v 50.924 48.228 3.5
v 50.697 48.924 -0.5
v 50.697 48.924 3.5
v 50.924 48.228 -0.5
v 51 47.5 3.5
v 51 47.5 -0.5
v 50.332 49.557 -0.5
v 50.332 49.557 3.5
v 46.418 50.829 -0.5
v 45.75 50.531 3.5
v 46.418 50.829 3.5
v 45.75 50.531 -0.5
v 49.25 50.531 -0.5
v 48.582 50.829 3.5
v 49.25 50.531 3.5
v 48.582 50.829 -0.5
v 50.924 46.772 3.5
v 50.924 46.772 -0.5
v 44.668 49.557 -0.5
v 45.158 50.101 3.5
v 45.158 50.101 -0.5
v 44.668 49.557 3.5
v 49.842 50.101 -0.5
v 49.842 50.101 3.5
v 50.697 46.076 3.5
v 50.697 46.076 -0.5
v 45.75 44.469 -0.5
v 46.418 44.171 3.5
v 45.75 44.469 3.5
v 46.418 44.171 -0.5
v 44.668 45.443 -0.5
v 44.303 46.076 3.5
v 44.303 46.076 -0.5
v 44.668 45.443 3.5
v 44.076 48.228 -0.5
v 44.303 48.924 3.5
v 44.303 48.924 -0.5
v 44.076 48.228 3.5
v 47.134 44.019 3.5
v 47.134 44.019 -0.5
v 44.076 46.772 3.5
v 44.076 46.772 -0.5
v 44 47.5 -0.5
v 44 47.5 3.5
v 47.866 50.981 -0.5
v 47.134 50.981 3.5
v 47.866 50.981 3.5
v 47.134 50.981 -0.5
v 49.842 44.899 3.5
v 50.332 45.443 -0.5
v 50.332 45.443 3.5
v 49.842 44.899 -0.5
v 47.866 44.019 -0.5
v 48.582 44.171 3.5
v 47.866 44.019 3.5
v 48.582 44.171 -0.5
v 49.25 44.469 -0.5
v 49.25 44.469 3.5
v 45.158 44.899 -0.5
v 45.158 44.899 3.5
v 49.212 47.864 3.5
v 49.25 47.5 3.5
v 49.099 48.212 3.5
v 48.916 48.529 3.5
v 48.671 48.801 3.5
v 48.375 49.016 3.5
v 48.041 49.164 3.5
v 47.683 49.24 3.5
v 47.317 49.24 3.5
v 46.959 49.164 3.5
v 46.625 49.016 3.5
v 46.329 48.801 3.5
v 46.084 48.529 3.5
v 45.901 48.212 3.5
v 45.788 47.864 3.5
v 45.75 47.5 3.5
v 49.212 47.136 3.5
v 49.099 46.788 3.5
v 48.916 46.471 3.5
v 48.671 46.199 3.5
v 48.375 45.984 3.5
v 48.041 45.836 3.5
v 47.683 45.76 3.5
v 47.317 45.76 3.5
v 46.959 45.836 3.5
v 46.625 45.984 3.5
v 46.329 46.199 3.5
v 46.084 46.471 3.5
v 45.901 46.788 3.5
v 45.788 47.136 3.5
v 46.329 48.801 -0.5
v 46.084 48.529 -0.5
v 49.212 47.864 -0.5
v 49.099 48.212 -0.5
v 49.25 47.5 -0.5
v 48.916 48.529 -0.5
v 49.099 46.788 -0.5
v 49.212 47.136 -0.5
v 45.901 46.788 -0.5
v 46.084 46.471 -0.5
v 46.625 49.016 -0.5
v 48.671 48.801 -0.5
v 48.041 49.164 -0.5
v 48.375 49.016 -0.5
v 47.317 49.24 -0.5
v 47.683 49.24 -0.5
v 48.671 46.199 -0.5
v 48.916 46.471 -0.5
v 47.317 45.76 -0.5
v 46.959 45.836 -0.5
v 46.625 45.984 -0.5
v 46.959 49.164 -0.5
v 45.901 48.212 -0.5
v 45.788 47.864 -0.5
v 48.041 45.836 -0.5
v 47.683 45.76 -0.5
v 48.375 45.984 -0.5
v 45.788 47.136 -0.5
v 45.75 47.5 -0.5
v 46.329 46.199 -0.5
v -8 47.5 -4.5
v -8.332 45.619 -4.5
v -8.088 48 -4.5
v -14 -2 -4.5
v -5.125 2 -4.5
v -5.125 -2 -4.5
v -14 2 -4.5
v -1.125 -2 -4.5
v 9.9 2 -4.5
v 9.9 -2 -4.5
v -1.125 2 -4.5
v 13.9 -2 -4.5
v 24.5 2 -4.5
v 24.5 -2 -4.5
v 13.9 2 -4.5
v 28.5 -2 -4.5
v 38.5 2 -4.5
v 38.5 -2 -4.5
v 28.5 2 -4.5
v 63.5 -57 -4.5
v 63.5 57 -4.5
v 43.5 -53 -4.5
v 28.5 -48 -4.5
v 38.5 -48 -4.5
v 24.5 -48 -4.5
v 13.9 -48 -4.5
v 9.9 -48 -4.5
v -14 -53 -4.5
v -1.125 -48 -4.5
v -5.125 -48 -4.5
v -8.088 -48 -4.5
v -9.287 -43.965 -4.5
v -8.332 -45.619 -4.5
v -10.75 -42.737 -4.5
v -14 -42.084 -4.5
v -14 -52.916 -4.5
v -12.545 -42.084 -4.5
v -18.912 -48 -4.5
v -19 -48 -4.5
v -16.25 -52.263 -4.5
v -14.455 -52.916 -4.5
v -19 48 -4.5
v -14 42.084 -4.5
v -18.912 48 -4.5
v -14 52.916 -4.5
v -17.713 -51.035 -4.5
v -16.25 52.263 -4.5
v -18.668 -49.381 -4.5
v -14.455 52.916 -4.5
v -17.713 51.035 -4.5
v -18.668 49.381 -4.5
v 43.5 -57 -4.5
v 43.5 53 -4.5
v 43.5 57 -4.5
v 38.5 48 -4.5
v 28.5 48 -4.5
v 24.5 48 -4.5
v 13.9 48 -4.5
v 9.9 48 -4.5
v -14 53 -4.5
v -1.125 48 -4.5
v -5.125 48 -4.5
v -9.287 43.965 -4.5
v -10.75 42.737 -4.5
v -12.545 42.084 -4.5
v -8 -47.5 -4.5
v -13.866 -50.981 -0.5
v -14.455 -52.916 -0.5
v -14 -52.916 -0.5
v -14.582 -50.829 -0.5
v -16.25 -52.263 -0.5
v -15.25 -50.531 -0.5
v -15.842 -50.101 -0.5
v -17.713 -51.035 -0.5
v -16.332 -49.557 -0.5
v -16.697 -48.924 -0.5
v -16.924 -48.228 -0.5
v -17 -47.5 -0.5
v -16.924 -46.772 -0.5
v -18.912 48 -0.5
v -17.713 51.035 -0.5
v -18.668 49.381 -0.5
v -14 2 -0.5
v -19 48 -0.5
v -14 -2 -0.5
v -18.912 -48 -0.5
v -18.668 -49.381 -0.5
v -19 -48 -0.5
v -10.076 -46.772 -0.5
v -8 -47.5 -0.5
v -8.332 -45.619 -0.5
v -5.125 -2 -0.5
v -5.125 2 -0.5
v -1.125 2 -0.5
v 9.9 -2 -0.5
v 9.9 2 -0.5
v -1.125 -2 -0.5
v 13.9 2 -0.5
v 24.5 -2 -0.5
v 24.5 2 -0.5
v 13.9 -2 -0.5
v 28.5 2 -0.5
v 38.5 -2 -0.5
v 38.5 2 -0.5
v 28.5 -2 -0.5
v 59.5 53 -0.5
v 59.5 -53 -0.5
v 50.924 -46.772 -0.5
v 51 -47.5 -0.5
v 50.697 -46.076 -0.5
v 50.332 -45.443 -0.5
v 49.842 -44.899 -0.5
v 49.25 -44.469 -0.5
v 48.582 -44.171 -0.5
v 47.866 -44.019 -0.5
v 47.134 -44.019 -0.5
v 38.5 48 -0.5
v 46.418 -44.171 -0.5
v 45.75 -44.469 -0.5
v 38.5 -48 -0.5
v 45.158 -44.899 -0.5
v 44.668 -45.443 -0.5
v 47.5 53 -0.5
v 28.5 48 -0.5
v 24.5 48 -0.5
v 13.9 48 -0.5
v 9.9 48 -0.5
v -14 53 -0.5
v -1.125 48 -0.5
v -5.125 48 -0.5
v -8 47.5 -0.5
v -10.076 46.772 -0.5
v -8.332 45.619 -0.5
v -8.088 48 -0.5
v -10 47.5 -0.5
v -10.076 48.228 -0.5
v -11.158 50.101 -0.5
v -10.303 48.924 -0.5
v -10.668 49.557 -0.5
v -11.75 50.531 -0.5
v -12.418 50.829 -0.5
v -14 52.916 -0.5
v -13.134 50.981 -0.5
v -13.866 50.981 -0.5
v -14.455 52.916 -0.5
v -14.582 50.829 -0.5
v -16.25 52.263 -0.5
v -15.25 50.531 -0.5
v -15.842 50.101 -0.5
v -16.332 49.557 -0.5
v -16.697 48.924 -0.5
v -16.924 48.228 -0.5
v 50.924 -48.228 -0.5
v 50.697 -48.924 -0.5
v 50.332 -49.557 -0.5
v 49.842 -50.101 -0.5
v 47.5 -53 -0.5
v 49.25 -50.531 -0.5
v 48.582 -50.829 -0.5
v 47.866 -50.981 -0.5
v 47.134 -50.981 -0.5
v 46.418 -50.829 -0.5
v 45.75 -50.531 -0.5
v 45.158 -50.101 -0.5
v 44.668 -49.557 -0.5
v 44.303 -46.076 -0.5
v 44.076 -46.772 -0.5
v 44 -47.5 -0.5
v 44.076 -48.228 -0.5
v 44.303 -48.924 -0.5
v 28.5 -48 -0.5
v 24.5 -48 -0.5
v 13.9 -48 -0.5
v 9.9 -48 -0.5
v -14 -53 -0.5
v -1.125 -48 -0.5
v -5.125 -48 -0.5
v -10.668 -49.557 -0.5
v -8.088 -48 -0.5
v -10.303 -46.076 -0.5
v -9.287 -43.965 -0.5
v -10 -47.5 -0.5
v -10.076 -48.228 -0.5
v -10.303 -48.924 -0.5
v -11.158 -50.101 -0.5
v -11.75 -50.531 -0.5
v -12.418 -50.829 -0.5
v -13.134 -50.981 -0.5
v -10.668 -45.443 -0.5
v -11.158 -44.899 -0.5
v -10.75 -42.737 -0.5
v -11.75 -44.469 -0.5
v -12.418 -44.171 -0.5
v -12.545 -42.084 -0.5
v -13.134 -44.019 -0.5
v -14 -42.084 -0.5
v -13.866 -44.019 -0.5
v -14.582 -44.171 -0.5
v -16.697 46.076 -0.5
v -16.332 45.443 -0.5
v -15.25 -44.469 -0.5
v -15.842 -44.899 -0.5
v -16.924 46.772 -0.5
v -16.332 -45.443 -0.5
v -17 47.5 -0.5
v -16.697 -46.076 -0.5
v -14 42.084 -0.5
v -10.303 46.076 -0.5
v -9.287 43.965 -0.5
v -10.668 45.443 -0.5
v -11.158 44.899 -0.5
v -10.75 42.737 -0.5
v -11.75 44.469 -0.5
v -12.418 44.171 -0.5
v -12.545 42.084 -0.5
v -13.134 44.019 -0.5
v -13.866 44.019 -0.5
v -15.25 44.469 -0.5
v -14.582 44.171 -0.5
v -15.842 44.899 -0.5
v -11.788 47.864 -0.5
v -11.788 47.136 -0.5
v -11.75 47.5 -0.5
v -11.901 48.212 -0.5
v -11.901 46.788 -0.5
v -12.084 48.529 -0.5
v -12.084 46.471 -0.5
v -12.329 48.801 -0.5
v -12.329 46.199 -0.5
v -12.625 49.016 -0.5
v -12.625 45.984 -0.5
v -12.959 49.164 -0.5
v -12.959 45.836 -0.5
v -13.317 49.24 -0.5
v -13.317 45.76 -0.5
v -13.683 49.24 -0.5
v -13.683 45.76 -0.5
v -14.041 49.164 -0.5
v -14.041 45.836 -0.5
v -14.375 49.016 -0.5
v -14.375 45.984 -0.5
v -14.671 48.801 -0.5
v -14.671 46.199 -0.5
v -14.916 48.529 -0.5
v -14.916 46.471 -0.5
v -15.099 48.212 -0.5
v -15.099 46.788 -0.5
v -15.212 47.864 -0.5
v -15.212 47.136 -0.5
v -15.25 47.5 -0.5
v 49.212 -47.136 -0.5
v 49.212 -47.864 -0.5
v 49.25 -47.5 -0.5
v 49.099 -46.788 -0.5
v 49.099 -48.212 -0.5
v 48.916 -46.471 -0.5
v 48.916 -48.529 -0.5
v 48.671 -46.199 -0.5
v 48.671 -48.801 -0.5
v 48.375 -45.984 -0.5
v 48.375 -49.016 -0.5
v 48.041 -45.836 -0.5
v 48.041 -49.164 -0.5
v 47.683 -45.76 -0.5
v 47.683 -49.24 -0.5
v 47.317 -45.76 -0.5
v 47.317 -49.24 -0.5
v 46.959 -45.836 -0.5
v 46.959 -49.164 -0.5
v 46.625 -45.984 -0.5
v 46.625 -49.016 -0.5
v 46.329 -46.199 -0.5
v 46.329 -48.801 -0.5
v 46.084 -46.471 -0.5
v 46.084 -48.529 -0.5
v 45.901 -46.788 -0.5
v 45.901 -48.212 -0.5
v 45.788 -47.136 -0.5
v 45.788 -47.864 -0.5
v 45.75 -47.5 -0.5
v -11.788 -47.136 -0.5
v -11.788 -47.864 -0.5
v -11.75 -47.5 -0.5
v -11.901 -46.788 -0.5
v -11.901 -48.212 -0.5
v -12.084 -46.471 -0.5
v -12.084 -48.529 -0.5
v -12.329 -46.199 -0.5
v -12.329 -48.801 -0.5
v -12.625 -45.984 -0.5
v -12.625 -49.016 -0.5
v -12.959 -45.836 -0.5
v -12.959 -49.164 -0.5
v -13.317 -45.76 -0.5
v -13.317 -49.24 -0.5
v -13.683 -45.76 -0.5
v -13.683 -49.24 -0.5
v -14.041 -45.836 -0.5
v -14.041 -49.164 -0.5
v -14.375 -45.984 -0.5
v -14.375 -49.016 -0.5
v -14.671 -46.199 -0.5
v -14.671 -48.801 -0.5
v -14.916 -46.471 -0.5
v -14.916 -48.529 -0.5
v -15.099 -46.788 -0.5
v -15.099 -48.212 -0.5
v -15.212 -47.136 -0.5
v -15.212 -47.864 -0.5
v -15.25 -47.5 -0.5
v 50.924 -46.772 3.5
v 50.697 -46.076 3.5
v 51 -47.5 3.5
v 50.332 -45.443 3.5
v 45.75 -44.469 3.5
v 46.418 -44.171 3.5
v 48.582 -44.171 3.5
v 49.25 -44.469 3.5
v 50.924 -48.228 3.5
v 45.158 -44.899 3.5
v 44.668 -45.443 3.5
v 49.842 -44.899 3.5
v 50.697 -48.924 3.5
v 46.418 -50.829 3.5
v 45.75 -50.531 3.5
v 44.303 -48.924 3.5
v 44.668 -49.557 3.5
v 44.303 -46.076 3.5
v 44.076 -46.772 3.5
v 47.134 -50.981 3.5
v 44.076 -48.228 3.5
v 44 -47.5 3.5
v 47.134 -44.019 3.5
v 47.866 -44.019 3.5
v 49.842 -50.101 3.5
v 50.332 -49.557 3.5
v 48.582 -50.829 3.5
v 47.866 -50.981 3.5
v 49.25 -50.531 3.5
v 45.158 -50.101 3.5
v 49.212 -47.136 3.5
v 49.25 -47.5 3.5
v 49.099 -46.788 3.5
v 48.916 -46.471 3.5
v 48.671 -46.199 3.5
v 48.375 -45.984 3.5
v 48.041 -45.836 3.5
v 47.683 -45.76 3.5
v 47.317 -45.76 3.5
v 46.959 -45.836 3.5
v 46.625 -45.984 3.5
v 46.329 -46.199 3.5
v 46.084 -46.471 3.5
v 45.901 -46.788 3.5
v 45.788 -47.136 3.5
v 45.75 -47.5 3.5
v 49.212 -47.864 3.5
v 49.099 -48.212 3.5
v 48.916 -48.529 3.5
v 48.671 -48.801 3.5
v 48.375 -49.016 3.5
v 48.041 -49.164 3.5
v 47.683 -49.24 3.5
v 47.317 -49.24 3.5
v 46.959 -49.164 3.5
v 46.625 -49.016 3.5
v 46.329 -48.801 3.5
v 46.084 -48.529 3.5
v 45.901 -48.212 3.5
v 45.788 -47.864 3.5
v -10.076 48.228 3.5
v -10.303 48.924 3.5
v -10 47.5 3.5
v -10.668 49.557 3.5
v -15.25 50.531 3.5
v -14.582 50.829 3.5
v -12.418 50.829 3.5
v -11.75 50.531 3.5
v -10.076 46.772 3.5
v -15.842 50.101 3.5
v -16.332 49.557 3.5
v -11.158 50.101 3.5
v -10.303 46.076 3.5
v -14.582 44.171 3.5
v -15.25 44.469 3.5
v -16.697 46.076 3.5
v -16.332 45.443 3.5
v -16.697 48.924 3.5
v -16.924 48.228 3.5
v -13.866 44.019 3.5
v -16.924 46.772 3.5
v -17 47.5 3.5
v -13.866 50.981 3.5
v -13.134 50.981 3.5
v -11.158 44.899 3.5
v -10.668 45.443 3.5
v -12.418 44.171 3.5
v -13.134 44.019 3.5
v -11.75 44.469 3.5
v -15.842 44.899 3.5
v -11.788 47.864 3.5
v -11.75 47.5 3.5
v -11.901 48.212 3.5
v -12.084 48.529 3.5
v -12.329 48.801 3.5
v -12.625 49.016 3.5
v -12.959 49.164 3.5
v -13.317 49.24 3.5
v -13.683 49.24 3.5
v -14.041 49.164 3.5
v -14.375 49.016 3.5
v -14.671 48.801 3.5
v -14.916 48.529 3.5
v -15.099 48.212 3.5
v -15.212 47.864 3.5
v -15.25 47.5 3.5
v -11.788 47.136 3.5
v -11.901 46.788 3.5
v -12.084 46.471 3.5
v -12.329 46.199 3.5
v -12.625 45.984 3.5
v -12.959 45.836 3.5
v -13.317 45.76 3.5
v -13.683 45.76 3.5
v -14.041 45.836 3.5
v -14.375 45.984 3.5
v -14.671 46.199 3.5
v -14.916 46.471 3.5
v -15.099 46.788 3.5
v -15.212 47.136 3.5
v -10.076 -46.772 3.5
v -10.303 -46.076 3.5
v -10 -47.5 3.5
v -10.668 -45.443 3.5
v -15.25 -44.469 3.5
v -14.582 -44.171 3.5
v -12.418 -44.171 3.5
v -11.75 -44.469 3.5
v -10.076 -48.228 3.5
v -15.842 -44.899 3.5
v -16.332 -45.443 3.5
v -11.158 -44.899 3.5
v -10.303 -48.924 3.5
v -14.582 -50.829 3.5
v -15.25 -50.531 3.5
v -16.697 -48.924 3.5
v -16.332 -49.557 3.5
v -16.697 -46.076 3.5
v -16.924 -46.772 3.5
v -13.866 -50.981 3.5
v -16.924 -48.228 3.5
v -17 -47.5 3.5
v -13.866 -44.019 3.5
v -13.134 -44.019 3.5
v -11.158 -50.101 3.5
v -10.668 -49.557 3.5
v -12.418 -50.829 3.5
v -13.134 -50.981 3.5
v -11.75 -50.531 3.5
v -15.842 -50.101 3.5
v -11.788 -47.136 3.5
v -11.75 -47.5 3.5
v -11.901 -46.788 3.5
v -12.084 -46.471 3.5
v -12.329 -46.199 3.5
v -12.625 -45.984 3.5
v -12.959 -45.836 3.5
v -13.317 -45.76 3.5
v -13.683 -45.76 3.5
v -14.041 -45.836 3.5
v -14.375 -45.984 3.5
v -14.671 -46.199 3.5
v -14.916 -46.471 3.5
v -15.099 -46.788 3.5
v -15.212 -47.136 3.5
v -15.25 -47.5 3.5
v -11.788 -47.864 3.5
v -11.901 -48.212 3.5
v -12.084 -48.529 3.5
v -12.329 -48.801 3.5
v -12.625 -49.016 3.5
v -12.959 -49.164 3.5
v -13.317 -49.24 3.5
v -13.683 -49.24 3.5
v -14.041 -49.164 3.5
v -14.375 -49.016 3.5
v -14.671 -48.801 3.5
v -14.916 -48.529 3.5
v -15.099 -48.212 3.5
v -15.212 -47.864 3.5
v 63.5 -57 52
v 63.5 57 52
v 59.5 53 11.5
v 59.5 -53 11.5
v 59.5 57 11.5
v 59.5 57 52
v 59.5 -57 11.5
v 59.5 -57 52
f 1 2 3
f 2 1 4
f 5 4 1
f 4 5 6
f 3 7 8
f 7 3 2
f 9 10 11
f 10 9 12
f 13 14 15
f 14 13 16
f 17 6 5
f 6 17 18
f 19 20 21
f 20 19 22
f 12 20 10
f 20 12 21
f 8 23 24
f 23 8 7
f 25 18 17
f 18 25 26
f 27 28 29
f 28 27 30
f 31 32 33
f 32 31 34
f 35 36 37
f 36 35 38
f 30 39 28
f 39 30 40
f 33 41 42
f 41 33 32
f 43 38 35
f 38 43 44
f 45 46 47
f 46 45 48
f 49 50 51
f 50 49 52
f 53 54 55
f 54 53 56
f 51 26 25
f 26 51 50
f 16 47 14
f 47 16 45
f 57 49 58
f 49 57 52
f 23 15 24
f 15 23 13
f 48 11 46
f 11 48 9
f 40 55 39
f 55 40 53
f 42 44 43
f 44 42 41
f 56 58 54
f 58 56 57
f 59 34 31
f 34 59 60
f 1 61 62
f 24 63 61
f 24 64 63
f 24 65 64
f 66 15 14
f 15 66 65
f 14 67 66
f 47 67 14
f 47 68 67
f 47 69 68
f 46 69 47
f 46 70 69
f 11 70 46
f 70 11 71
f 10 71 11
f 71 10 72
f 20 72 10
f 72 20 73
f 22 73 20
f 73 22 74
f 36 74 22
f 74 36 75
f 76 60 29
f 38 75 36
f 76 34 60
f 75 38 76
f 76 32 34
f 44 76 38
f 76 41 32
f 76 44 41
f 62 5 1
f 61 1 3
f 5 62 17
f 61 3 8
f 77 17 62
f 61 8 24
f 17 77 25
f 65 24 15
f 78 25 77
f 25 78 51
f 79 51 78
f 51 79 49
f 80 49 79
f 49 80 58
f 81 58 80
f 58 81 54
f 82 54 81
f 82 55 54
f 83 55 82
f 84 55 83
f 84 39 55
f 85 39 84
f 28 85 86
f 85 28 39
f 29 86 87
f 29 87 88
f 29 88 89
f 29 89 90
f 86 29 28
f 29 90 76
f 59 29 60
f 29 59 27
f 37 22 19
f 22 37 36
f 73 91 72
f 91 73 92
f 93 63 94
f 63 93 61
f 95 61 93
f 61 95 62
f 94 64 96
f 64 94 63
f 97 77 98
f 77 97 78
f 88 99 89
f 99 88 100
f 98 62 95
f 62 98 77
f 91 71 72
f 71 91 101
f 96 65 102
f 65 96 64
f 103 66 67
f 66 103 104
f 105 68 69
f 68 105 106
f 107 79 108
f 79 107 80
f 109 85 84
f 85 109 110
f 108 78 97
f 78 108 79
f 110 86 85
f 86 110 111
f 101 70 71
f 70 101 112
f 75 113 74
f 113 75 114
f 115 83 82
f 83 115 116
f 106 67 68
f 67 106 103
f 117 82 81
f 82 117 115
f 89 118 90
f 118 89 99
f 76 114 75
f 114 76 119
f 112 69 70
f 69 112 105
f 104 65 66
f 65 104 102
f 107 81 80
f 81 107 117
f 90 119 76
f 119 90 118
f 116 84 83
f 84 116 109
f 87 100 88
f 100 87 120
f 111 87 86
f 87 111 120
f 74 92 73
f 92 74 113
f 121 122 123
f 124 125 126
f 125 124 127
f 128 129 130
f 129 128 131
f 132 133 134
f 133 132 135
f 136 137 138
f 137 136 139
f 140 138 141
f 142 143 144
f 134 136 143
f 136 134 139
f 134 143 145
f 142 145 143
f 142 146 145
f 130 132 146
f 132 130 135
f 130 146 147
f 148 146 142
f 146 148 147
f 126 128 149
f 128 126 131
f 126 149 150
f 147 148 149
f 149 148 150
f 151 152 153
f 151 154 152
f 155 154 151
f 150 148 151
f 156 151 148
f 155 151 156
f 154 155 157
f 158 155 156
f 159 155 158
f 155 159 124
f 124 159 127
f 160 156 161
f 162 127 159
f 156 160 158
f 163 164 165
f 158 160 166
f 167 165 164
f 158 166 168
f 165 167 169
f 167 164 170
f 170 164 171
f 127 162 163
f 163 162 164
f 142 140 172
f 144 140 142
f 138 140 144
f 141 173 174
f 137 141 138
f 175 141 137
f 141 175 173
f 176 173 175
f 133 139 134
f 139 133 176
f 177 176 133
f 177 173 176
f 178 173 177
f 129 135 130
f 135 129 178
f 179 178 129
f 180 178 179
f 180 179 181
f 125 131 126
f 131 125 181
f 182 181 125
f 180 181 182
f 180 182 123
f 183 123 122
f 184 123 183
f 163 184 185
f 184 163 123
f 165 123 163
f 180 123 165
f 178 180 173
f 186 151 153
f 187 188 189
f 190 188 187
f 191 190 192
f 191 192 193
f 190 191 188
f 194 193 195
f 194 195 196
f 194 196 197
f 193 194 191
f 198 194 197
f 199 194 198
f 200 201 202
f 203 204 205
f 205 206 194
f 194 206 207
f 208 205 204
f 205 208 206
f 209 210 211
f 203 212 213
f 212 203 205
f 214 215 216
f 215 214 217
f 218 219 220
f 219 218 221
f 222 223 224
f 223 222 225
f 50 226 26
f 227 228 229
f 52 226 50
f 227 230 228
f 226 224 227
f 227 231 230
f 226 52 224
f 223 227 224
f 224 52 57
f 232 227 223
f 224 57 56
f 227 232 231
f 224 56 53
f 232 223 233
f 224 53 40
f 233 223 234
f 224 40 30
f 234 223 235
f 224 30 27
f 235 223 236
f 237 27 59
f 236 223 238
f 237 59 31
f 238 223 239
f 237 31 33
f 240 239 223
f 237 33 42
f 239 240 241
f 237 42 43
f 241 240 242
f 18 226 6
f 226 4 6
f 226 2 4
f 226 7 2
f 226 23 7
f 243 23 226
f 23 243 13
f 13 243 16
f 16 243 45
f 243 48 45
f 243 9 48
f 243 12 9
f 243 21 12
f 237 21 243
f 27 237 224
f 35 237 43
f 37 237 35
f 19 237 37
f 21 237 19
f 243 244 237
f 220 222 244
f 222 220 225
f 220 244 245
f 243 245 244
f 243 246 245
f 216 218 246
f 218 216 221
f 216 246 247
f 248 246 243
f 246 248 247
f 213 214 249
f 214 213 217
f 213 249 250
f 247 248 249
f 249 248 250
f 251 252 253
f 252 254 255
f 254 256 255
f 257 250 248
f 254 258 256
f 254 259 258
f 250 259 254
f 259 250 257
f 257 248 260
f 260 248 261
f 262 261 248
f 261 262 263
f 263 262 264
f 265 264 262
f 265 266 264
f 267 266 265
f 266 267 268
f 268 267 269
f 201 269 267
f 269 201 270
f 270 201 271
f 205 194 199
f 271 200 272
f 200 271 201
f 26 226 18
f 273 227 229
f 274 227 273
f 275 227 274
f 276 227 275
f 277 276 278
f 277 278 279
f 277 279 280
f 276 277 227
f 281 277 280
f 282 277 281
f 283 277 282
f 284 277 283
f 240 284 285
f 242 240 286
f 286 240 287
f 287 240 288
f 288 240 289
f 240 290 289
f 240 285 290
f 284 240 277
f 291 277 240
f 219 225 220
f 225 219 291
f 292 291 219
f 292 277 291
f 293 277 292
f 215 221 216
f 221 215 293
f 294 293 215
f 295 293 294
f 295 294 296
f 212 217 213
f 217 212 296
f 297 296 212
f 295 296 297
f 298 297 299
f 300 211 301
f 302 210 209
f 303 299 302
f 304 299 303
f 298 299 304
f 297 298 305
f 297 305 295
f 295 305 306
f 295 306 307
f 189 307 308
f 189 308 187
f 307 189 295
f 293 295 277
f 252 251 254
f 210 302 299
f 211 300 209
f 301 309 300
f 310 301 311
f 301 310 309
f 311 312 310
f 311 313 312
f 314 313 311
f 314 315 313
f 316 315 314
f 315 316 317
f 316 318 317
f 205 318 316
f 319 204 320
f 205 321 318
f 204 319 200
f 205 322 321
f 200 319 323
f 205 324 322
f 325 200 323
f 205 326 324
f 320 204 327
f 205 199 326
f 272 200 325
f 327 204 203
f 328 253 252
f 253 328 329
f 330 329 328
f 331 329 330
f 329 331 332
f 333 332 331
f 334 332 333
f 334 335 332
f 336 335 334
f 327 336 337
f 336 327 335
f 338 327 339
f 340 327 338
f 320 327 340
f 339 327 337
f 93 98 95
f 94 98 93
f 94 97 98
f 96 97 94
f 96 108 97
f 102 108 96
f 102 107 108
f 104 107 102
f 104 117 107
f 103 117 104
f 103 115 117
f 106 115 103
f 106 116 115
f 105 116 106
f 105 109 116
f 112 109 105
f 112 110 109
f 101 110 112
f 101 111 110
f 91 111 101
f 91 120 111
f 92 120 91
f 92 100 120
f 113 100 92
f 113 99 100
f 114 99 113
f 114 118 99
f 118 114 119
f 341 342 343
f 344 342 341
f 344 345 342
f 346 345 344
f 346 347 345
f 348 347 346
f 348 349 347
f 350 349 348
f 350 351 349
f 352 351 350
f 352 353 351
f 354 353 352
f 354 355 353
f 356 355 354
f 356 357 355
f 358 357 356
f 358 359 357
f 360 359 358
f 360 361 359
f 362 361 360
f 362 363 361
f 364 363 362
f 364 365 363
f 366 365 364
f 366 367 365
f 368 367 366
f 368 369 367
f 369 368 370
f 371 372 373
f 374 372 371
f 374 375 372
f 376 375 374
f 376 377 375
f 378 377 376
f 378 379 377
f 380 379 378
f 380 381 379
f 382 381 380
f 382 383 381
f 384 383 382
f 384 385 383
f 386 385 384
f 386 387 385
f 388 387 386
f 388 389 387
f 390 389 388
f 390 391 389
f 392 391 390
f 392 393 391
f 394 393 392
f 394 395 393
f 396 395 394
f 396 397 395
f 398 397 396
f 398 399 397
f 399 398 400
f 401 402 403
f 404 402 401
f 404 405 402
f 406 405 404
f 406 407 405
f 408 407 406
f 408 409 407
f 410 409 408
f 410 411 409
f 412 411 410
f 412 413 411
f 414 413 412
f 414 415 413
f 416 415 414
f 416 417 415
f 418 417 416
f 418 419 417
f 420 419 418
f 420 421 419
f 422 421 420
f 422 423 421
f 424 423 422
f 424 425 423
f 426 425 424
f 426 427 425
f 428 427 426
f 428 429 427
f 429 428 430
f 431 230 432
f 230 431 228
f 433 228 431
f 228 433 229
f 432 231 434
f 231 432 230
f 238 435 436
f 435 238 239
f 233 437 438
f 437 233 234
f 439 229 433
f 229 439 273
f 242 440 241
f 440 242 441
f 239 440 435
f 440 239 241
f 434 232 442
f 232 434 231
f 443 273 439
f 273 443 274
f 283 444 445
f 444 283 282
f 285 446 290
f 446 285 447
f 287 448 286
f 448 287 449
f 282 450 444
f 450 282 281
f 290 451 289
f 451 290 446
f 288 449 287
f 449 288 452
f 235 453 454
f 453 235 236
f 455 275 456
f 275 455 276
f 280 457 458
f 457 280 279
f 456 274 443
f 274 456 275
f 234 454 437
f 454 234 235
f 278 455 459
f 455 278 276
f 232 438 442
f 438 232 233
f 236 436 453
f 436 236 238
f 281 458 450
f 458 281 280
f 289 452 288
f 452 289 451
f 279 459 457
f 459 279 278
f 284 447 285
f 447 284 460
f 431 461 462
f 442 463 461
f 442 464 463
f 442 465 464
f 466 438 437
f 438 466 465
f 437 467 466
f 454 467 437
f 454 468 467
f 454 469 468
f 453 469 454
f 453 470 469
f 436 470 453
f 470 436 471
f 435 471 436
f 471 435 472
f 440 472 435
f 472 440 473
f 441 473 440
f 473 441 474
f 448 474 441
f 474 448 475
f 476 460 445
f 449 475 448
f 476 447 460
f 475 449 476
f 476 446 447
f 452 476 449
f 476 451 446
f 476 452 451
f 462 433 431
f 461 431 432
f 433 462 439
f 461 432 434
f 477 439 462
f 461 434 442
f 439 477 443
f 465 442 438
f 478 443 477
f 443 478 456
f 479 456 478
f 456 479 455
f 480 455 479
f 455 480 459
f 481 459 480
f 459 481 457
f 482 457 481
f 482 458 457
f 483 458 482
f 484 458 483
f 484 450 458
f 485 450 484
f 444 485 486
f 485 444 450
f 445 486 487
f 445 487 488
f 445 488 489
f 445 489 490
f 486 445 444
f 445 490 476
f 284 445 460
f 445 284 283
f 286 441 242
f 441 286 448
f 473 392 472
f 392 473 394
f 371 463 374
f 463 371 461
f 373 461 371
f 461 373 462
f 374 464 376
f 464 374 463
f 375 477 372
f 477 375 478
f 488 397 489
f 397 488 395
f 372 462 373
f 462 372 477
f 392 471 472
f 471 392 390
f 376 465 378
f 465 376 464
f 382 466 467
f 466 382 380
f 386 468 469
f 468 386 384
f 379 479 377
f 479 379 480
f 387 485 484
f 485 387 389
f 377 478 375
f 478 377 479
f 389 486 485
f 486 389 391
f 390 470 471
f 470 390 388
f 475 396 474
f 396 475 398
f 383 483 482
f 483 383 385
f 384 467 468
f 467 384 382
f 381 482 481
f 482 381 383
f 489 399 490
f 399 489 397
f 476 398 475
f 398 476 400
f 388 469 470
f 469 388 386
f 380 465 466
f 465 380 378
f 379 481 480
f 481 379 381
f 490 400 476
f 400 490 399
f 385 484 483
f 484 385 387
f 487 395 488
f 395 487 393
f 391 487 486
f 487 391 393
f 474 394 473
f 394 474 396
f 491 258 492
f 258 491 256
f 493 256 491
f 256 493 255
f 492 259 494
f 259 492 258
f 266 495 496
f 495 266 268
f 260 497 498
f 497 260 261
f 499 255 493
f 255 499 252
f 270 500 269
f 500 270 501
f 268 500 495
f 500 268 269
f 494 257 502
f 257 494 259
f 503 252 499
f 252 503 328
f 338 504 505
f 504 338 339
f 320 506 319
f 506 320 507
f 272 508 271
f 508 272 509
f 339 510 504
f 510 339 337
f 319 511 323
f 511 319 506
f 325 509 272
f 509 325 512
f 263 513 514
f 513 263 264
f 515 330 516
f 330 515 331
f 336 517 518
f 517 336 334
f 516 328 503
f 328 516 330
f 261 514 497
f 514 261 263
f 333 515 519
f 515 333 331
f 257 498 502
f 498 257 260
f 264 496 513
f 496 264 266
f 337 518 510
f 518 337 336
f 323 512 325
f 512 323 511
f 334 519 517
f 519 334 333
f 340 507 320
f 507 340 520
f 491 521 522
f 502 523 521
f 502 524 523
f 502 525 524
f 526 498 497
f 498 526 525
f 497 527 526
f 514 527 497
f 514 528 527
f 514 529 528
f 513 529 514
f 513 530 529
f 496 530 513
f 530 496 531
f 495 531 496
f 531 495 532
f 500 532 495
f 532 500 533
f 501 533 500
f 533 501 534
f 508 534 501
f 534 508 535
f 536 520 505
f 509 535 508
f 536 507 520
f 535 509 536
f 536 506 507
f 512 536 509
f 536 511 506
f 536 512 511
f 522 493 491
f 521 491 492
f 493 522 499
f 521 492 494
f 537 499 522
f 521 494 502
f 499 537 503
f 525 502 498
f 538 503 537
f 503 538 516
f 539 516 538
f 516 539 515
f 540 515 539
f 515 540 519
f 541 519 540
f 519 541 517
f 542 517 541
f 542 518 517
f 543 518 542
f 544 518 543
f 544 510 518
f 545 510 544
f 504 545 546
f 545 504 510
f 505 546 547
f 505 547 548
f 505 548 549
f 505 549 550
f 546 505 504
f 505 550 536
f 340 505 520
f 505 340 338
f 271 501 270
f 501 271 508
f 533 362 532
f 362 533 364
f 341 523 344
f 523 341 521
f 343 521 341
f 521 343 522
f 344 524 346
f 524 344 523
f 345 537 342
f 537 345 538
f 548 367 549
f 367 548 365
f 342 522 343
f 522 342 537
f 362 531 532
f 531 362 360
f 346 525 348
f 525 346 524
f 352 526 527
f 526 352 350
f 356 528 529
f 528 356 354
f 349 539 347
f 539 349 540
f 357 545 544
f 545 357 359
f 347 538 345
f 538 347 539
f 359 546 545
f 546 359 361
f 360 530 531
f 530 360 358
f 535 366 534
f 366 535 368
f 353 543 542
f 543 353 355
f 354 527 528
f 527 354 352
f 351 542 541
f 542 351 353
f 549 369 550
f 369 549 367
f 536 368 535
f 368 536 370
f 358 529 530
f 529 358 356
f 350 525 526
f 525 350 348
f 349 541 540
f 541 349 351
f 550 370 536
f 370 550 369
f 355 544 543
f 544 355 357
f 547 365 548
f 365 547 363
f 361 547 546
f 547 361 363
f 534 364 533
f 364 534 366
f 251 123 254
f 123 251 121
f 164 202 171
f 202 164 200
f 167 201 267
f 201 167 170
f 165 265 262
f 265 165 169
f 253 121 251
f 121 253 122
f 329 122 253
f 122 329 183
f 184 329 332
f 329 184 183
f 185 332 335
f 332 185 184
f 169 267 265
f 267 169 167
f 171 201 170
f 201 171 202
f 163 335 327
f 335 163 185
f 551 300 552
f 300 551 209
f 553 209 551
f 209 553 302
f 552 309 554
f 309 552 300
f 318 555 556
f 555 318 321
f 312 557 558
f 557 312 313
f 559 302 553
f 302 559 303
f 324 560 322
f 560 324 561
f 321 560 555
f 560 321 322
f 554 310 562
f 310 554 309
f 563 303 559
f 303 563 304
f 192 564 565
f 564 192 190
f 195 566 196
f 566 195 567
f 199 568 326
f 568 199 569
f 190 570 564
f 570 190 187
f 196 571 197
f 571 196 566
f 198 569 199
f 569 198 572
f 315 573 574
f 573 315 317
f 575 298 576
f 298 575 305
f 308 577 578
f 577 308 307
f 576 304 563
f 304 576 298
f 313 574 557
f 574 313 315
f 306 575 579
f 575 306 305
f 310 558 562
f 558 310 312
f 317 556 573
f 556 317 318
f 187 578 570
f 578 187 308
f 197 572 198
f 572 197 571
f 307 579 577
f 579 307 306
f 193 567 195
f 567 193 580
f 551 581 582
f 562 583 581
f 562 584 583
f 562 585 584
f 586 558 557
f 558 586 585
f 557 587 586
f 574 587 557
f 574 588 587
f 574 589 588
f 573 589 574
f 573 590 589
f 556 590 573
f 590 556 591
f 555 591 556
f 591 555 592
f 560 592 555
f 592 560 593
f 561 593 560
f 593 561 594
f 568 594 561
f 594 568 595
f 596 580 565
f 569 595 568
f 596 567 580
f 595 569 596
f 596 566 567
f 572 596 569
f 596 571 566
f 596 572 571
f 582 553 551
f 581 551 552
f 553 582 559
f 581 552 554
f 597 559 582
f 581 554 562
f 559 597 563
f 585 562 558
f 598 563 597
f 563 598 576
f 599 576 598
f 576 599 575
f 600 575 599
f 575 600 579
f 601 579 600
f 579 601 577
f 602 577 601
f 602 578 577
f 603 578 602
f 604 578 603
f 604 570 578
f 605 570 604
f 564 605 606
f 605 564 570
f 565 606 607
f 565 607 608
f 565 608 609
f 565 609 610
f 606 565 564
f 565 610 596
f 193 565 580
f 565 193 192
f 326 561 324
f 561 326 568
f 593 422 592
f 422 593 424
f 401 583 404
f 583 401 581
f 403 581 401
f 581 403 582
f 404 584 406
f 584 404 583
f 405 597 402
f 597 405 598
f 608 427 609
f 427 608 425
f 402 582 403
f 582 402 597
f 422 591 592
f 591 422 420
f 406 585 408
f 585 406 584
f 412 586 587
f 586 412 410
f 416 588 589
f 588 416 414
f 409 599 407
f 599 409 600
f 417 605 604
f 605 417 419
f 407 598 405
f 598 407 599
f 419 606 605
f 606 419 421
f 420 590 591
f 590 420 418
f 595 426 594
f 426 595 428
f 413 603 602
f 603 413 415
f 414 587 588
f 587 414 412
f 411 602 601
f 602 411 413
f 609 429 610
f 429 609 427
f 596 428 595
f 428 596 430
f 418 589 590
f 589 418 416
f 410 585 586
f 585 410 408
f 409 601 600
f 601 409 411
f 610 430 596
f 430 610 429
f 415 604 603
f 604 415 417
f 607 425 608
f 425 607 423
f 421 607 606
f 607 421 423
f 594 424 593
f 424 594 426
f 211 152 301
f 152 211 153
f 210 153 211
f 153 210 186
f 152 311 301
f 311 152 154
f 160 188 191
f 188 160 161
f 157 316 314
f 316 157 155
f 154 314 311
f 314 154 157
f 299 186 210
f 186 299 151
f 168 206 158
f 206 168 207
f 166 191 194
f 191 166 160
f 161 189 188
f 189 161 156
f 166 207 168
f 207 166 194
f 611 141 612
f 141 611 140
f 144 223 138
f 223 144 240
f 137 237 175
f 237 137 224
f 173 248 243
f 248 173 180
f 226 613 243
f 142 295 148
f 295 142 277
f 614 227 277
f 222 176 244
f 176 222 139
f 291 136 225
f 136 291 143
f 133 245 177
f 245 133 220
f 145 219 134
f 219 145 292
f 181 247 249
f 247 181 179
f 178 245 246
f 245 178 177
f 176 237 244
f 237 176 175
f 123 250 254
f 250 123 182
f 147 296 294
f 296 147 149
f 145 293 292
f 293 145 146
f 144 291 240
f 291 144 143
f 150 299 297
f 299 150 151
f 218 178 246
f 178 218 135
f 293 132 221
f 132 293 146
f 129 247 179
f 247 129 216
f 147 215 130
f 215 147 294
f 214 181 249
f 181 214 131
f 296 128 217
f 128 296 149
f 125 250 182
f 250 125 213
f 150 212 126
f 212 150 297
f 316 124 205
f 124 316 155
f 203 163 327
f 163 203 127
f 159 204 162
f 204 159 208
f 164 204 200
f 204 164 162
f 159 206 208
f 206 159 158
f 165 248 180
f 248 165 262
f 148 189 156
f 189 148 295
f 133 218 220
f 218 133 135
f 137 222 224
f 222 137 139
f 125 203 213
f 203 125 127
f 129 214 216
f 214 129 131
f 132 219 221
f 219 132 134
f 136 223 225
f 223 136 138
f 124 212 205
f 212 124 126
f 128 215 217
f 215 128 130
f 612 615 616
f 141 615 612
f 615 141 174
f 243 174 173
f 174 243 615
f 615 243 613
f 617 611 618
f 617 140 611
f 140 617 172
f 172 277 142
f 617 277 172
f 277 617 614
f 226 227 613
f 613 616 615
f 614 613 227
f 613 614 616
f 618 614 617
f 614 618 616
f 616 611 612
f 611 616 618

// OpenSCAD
module ramboholes() {
	difference() {
		cylinder(r=7/2, h=7, center=true, $fn=30);
		cylinder(r=7/4, h=8, center=true, $fn=30);
	}
}

module rambopegs() {
	union() {
		translate([95/2, 95/2, 0]) {
			ramboholes();
			translate([0,0,-2.5]) cylinder(r=11/2, h=4, center=true);
		}
		translate([95/2, -95/2, 0]) {
			ramboholes();
			translate([0,0,-2.5]) cylinder(r=11/2, h=4, center=true);
		}
		translate([-13.5, 95/2, 0]) {
			ramboholes();
			translate([0,0,-2.5]) cylinder(r=11/2, h=4, center=true);
		}
		translate([-13.5, -95/2, 0]) {
			ramboholes();
			translate([0,0,-2.5]) cylinder(r=11/2, h=4, center=true);
		}
	}
}

module ramboframe() {
	translate([102/2,0,-2.5]) cube(size=[25,106, 4], center=true);

	translate([102/3 - 7.5,0,-2.5]) cube(size=[4,96, 4], center=true);
	translate([102/5 - 8.5,0,-2.5]) cube(size=[4,96, 4], center=true);
	translate([102/16 - 9.5,0,-2.5]) cube(size=[4,96, 4], center=true);
	translate([-96/16 - 10.5,0,-2.5]) cube(size=[5,96, 4], center=true);
    
    translate([17,101/2,-2.5]) cube(size=[62,5, 4], center=true);
	translate([17,-101/2,-2.5]) cube(size=[62,5, 4], center=true);
	translate([17,0,-2.5]) cube(size=[66,4, 4], center=true);
}


module arduino()
{
	translate([119/2, -114/2, -1]) rotate([90, 0, 90]) {
		difference() {
			// the arduino cube
			cube([114, 53, 4]);
		}
	}
}

module mountBraces()
{
	 rotate([90, -90, 0]) {
		translate([-4.5, -127/2, -110/2])
		linear_extrude(height = 4, center = true, convexity = 10, twist = 0)
		polygon(points=[[0,0],[20,0],[0,20]]);
		
		translate([-4.5, -127/2, 110/2])
		linear_extrude(height = 4, center = true, convexity = 10, twist = 0)
		polygon(points=[[0,0],[20,0],[0,20]]);
	}
}

module rambo()
{
	rambopegs();
	ramboframe();
}



rambo();
arduino();
mountBraces();
